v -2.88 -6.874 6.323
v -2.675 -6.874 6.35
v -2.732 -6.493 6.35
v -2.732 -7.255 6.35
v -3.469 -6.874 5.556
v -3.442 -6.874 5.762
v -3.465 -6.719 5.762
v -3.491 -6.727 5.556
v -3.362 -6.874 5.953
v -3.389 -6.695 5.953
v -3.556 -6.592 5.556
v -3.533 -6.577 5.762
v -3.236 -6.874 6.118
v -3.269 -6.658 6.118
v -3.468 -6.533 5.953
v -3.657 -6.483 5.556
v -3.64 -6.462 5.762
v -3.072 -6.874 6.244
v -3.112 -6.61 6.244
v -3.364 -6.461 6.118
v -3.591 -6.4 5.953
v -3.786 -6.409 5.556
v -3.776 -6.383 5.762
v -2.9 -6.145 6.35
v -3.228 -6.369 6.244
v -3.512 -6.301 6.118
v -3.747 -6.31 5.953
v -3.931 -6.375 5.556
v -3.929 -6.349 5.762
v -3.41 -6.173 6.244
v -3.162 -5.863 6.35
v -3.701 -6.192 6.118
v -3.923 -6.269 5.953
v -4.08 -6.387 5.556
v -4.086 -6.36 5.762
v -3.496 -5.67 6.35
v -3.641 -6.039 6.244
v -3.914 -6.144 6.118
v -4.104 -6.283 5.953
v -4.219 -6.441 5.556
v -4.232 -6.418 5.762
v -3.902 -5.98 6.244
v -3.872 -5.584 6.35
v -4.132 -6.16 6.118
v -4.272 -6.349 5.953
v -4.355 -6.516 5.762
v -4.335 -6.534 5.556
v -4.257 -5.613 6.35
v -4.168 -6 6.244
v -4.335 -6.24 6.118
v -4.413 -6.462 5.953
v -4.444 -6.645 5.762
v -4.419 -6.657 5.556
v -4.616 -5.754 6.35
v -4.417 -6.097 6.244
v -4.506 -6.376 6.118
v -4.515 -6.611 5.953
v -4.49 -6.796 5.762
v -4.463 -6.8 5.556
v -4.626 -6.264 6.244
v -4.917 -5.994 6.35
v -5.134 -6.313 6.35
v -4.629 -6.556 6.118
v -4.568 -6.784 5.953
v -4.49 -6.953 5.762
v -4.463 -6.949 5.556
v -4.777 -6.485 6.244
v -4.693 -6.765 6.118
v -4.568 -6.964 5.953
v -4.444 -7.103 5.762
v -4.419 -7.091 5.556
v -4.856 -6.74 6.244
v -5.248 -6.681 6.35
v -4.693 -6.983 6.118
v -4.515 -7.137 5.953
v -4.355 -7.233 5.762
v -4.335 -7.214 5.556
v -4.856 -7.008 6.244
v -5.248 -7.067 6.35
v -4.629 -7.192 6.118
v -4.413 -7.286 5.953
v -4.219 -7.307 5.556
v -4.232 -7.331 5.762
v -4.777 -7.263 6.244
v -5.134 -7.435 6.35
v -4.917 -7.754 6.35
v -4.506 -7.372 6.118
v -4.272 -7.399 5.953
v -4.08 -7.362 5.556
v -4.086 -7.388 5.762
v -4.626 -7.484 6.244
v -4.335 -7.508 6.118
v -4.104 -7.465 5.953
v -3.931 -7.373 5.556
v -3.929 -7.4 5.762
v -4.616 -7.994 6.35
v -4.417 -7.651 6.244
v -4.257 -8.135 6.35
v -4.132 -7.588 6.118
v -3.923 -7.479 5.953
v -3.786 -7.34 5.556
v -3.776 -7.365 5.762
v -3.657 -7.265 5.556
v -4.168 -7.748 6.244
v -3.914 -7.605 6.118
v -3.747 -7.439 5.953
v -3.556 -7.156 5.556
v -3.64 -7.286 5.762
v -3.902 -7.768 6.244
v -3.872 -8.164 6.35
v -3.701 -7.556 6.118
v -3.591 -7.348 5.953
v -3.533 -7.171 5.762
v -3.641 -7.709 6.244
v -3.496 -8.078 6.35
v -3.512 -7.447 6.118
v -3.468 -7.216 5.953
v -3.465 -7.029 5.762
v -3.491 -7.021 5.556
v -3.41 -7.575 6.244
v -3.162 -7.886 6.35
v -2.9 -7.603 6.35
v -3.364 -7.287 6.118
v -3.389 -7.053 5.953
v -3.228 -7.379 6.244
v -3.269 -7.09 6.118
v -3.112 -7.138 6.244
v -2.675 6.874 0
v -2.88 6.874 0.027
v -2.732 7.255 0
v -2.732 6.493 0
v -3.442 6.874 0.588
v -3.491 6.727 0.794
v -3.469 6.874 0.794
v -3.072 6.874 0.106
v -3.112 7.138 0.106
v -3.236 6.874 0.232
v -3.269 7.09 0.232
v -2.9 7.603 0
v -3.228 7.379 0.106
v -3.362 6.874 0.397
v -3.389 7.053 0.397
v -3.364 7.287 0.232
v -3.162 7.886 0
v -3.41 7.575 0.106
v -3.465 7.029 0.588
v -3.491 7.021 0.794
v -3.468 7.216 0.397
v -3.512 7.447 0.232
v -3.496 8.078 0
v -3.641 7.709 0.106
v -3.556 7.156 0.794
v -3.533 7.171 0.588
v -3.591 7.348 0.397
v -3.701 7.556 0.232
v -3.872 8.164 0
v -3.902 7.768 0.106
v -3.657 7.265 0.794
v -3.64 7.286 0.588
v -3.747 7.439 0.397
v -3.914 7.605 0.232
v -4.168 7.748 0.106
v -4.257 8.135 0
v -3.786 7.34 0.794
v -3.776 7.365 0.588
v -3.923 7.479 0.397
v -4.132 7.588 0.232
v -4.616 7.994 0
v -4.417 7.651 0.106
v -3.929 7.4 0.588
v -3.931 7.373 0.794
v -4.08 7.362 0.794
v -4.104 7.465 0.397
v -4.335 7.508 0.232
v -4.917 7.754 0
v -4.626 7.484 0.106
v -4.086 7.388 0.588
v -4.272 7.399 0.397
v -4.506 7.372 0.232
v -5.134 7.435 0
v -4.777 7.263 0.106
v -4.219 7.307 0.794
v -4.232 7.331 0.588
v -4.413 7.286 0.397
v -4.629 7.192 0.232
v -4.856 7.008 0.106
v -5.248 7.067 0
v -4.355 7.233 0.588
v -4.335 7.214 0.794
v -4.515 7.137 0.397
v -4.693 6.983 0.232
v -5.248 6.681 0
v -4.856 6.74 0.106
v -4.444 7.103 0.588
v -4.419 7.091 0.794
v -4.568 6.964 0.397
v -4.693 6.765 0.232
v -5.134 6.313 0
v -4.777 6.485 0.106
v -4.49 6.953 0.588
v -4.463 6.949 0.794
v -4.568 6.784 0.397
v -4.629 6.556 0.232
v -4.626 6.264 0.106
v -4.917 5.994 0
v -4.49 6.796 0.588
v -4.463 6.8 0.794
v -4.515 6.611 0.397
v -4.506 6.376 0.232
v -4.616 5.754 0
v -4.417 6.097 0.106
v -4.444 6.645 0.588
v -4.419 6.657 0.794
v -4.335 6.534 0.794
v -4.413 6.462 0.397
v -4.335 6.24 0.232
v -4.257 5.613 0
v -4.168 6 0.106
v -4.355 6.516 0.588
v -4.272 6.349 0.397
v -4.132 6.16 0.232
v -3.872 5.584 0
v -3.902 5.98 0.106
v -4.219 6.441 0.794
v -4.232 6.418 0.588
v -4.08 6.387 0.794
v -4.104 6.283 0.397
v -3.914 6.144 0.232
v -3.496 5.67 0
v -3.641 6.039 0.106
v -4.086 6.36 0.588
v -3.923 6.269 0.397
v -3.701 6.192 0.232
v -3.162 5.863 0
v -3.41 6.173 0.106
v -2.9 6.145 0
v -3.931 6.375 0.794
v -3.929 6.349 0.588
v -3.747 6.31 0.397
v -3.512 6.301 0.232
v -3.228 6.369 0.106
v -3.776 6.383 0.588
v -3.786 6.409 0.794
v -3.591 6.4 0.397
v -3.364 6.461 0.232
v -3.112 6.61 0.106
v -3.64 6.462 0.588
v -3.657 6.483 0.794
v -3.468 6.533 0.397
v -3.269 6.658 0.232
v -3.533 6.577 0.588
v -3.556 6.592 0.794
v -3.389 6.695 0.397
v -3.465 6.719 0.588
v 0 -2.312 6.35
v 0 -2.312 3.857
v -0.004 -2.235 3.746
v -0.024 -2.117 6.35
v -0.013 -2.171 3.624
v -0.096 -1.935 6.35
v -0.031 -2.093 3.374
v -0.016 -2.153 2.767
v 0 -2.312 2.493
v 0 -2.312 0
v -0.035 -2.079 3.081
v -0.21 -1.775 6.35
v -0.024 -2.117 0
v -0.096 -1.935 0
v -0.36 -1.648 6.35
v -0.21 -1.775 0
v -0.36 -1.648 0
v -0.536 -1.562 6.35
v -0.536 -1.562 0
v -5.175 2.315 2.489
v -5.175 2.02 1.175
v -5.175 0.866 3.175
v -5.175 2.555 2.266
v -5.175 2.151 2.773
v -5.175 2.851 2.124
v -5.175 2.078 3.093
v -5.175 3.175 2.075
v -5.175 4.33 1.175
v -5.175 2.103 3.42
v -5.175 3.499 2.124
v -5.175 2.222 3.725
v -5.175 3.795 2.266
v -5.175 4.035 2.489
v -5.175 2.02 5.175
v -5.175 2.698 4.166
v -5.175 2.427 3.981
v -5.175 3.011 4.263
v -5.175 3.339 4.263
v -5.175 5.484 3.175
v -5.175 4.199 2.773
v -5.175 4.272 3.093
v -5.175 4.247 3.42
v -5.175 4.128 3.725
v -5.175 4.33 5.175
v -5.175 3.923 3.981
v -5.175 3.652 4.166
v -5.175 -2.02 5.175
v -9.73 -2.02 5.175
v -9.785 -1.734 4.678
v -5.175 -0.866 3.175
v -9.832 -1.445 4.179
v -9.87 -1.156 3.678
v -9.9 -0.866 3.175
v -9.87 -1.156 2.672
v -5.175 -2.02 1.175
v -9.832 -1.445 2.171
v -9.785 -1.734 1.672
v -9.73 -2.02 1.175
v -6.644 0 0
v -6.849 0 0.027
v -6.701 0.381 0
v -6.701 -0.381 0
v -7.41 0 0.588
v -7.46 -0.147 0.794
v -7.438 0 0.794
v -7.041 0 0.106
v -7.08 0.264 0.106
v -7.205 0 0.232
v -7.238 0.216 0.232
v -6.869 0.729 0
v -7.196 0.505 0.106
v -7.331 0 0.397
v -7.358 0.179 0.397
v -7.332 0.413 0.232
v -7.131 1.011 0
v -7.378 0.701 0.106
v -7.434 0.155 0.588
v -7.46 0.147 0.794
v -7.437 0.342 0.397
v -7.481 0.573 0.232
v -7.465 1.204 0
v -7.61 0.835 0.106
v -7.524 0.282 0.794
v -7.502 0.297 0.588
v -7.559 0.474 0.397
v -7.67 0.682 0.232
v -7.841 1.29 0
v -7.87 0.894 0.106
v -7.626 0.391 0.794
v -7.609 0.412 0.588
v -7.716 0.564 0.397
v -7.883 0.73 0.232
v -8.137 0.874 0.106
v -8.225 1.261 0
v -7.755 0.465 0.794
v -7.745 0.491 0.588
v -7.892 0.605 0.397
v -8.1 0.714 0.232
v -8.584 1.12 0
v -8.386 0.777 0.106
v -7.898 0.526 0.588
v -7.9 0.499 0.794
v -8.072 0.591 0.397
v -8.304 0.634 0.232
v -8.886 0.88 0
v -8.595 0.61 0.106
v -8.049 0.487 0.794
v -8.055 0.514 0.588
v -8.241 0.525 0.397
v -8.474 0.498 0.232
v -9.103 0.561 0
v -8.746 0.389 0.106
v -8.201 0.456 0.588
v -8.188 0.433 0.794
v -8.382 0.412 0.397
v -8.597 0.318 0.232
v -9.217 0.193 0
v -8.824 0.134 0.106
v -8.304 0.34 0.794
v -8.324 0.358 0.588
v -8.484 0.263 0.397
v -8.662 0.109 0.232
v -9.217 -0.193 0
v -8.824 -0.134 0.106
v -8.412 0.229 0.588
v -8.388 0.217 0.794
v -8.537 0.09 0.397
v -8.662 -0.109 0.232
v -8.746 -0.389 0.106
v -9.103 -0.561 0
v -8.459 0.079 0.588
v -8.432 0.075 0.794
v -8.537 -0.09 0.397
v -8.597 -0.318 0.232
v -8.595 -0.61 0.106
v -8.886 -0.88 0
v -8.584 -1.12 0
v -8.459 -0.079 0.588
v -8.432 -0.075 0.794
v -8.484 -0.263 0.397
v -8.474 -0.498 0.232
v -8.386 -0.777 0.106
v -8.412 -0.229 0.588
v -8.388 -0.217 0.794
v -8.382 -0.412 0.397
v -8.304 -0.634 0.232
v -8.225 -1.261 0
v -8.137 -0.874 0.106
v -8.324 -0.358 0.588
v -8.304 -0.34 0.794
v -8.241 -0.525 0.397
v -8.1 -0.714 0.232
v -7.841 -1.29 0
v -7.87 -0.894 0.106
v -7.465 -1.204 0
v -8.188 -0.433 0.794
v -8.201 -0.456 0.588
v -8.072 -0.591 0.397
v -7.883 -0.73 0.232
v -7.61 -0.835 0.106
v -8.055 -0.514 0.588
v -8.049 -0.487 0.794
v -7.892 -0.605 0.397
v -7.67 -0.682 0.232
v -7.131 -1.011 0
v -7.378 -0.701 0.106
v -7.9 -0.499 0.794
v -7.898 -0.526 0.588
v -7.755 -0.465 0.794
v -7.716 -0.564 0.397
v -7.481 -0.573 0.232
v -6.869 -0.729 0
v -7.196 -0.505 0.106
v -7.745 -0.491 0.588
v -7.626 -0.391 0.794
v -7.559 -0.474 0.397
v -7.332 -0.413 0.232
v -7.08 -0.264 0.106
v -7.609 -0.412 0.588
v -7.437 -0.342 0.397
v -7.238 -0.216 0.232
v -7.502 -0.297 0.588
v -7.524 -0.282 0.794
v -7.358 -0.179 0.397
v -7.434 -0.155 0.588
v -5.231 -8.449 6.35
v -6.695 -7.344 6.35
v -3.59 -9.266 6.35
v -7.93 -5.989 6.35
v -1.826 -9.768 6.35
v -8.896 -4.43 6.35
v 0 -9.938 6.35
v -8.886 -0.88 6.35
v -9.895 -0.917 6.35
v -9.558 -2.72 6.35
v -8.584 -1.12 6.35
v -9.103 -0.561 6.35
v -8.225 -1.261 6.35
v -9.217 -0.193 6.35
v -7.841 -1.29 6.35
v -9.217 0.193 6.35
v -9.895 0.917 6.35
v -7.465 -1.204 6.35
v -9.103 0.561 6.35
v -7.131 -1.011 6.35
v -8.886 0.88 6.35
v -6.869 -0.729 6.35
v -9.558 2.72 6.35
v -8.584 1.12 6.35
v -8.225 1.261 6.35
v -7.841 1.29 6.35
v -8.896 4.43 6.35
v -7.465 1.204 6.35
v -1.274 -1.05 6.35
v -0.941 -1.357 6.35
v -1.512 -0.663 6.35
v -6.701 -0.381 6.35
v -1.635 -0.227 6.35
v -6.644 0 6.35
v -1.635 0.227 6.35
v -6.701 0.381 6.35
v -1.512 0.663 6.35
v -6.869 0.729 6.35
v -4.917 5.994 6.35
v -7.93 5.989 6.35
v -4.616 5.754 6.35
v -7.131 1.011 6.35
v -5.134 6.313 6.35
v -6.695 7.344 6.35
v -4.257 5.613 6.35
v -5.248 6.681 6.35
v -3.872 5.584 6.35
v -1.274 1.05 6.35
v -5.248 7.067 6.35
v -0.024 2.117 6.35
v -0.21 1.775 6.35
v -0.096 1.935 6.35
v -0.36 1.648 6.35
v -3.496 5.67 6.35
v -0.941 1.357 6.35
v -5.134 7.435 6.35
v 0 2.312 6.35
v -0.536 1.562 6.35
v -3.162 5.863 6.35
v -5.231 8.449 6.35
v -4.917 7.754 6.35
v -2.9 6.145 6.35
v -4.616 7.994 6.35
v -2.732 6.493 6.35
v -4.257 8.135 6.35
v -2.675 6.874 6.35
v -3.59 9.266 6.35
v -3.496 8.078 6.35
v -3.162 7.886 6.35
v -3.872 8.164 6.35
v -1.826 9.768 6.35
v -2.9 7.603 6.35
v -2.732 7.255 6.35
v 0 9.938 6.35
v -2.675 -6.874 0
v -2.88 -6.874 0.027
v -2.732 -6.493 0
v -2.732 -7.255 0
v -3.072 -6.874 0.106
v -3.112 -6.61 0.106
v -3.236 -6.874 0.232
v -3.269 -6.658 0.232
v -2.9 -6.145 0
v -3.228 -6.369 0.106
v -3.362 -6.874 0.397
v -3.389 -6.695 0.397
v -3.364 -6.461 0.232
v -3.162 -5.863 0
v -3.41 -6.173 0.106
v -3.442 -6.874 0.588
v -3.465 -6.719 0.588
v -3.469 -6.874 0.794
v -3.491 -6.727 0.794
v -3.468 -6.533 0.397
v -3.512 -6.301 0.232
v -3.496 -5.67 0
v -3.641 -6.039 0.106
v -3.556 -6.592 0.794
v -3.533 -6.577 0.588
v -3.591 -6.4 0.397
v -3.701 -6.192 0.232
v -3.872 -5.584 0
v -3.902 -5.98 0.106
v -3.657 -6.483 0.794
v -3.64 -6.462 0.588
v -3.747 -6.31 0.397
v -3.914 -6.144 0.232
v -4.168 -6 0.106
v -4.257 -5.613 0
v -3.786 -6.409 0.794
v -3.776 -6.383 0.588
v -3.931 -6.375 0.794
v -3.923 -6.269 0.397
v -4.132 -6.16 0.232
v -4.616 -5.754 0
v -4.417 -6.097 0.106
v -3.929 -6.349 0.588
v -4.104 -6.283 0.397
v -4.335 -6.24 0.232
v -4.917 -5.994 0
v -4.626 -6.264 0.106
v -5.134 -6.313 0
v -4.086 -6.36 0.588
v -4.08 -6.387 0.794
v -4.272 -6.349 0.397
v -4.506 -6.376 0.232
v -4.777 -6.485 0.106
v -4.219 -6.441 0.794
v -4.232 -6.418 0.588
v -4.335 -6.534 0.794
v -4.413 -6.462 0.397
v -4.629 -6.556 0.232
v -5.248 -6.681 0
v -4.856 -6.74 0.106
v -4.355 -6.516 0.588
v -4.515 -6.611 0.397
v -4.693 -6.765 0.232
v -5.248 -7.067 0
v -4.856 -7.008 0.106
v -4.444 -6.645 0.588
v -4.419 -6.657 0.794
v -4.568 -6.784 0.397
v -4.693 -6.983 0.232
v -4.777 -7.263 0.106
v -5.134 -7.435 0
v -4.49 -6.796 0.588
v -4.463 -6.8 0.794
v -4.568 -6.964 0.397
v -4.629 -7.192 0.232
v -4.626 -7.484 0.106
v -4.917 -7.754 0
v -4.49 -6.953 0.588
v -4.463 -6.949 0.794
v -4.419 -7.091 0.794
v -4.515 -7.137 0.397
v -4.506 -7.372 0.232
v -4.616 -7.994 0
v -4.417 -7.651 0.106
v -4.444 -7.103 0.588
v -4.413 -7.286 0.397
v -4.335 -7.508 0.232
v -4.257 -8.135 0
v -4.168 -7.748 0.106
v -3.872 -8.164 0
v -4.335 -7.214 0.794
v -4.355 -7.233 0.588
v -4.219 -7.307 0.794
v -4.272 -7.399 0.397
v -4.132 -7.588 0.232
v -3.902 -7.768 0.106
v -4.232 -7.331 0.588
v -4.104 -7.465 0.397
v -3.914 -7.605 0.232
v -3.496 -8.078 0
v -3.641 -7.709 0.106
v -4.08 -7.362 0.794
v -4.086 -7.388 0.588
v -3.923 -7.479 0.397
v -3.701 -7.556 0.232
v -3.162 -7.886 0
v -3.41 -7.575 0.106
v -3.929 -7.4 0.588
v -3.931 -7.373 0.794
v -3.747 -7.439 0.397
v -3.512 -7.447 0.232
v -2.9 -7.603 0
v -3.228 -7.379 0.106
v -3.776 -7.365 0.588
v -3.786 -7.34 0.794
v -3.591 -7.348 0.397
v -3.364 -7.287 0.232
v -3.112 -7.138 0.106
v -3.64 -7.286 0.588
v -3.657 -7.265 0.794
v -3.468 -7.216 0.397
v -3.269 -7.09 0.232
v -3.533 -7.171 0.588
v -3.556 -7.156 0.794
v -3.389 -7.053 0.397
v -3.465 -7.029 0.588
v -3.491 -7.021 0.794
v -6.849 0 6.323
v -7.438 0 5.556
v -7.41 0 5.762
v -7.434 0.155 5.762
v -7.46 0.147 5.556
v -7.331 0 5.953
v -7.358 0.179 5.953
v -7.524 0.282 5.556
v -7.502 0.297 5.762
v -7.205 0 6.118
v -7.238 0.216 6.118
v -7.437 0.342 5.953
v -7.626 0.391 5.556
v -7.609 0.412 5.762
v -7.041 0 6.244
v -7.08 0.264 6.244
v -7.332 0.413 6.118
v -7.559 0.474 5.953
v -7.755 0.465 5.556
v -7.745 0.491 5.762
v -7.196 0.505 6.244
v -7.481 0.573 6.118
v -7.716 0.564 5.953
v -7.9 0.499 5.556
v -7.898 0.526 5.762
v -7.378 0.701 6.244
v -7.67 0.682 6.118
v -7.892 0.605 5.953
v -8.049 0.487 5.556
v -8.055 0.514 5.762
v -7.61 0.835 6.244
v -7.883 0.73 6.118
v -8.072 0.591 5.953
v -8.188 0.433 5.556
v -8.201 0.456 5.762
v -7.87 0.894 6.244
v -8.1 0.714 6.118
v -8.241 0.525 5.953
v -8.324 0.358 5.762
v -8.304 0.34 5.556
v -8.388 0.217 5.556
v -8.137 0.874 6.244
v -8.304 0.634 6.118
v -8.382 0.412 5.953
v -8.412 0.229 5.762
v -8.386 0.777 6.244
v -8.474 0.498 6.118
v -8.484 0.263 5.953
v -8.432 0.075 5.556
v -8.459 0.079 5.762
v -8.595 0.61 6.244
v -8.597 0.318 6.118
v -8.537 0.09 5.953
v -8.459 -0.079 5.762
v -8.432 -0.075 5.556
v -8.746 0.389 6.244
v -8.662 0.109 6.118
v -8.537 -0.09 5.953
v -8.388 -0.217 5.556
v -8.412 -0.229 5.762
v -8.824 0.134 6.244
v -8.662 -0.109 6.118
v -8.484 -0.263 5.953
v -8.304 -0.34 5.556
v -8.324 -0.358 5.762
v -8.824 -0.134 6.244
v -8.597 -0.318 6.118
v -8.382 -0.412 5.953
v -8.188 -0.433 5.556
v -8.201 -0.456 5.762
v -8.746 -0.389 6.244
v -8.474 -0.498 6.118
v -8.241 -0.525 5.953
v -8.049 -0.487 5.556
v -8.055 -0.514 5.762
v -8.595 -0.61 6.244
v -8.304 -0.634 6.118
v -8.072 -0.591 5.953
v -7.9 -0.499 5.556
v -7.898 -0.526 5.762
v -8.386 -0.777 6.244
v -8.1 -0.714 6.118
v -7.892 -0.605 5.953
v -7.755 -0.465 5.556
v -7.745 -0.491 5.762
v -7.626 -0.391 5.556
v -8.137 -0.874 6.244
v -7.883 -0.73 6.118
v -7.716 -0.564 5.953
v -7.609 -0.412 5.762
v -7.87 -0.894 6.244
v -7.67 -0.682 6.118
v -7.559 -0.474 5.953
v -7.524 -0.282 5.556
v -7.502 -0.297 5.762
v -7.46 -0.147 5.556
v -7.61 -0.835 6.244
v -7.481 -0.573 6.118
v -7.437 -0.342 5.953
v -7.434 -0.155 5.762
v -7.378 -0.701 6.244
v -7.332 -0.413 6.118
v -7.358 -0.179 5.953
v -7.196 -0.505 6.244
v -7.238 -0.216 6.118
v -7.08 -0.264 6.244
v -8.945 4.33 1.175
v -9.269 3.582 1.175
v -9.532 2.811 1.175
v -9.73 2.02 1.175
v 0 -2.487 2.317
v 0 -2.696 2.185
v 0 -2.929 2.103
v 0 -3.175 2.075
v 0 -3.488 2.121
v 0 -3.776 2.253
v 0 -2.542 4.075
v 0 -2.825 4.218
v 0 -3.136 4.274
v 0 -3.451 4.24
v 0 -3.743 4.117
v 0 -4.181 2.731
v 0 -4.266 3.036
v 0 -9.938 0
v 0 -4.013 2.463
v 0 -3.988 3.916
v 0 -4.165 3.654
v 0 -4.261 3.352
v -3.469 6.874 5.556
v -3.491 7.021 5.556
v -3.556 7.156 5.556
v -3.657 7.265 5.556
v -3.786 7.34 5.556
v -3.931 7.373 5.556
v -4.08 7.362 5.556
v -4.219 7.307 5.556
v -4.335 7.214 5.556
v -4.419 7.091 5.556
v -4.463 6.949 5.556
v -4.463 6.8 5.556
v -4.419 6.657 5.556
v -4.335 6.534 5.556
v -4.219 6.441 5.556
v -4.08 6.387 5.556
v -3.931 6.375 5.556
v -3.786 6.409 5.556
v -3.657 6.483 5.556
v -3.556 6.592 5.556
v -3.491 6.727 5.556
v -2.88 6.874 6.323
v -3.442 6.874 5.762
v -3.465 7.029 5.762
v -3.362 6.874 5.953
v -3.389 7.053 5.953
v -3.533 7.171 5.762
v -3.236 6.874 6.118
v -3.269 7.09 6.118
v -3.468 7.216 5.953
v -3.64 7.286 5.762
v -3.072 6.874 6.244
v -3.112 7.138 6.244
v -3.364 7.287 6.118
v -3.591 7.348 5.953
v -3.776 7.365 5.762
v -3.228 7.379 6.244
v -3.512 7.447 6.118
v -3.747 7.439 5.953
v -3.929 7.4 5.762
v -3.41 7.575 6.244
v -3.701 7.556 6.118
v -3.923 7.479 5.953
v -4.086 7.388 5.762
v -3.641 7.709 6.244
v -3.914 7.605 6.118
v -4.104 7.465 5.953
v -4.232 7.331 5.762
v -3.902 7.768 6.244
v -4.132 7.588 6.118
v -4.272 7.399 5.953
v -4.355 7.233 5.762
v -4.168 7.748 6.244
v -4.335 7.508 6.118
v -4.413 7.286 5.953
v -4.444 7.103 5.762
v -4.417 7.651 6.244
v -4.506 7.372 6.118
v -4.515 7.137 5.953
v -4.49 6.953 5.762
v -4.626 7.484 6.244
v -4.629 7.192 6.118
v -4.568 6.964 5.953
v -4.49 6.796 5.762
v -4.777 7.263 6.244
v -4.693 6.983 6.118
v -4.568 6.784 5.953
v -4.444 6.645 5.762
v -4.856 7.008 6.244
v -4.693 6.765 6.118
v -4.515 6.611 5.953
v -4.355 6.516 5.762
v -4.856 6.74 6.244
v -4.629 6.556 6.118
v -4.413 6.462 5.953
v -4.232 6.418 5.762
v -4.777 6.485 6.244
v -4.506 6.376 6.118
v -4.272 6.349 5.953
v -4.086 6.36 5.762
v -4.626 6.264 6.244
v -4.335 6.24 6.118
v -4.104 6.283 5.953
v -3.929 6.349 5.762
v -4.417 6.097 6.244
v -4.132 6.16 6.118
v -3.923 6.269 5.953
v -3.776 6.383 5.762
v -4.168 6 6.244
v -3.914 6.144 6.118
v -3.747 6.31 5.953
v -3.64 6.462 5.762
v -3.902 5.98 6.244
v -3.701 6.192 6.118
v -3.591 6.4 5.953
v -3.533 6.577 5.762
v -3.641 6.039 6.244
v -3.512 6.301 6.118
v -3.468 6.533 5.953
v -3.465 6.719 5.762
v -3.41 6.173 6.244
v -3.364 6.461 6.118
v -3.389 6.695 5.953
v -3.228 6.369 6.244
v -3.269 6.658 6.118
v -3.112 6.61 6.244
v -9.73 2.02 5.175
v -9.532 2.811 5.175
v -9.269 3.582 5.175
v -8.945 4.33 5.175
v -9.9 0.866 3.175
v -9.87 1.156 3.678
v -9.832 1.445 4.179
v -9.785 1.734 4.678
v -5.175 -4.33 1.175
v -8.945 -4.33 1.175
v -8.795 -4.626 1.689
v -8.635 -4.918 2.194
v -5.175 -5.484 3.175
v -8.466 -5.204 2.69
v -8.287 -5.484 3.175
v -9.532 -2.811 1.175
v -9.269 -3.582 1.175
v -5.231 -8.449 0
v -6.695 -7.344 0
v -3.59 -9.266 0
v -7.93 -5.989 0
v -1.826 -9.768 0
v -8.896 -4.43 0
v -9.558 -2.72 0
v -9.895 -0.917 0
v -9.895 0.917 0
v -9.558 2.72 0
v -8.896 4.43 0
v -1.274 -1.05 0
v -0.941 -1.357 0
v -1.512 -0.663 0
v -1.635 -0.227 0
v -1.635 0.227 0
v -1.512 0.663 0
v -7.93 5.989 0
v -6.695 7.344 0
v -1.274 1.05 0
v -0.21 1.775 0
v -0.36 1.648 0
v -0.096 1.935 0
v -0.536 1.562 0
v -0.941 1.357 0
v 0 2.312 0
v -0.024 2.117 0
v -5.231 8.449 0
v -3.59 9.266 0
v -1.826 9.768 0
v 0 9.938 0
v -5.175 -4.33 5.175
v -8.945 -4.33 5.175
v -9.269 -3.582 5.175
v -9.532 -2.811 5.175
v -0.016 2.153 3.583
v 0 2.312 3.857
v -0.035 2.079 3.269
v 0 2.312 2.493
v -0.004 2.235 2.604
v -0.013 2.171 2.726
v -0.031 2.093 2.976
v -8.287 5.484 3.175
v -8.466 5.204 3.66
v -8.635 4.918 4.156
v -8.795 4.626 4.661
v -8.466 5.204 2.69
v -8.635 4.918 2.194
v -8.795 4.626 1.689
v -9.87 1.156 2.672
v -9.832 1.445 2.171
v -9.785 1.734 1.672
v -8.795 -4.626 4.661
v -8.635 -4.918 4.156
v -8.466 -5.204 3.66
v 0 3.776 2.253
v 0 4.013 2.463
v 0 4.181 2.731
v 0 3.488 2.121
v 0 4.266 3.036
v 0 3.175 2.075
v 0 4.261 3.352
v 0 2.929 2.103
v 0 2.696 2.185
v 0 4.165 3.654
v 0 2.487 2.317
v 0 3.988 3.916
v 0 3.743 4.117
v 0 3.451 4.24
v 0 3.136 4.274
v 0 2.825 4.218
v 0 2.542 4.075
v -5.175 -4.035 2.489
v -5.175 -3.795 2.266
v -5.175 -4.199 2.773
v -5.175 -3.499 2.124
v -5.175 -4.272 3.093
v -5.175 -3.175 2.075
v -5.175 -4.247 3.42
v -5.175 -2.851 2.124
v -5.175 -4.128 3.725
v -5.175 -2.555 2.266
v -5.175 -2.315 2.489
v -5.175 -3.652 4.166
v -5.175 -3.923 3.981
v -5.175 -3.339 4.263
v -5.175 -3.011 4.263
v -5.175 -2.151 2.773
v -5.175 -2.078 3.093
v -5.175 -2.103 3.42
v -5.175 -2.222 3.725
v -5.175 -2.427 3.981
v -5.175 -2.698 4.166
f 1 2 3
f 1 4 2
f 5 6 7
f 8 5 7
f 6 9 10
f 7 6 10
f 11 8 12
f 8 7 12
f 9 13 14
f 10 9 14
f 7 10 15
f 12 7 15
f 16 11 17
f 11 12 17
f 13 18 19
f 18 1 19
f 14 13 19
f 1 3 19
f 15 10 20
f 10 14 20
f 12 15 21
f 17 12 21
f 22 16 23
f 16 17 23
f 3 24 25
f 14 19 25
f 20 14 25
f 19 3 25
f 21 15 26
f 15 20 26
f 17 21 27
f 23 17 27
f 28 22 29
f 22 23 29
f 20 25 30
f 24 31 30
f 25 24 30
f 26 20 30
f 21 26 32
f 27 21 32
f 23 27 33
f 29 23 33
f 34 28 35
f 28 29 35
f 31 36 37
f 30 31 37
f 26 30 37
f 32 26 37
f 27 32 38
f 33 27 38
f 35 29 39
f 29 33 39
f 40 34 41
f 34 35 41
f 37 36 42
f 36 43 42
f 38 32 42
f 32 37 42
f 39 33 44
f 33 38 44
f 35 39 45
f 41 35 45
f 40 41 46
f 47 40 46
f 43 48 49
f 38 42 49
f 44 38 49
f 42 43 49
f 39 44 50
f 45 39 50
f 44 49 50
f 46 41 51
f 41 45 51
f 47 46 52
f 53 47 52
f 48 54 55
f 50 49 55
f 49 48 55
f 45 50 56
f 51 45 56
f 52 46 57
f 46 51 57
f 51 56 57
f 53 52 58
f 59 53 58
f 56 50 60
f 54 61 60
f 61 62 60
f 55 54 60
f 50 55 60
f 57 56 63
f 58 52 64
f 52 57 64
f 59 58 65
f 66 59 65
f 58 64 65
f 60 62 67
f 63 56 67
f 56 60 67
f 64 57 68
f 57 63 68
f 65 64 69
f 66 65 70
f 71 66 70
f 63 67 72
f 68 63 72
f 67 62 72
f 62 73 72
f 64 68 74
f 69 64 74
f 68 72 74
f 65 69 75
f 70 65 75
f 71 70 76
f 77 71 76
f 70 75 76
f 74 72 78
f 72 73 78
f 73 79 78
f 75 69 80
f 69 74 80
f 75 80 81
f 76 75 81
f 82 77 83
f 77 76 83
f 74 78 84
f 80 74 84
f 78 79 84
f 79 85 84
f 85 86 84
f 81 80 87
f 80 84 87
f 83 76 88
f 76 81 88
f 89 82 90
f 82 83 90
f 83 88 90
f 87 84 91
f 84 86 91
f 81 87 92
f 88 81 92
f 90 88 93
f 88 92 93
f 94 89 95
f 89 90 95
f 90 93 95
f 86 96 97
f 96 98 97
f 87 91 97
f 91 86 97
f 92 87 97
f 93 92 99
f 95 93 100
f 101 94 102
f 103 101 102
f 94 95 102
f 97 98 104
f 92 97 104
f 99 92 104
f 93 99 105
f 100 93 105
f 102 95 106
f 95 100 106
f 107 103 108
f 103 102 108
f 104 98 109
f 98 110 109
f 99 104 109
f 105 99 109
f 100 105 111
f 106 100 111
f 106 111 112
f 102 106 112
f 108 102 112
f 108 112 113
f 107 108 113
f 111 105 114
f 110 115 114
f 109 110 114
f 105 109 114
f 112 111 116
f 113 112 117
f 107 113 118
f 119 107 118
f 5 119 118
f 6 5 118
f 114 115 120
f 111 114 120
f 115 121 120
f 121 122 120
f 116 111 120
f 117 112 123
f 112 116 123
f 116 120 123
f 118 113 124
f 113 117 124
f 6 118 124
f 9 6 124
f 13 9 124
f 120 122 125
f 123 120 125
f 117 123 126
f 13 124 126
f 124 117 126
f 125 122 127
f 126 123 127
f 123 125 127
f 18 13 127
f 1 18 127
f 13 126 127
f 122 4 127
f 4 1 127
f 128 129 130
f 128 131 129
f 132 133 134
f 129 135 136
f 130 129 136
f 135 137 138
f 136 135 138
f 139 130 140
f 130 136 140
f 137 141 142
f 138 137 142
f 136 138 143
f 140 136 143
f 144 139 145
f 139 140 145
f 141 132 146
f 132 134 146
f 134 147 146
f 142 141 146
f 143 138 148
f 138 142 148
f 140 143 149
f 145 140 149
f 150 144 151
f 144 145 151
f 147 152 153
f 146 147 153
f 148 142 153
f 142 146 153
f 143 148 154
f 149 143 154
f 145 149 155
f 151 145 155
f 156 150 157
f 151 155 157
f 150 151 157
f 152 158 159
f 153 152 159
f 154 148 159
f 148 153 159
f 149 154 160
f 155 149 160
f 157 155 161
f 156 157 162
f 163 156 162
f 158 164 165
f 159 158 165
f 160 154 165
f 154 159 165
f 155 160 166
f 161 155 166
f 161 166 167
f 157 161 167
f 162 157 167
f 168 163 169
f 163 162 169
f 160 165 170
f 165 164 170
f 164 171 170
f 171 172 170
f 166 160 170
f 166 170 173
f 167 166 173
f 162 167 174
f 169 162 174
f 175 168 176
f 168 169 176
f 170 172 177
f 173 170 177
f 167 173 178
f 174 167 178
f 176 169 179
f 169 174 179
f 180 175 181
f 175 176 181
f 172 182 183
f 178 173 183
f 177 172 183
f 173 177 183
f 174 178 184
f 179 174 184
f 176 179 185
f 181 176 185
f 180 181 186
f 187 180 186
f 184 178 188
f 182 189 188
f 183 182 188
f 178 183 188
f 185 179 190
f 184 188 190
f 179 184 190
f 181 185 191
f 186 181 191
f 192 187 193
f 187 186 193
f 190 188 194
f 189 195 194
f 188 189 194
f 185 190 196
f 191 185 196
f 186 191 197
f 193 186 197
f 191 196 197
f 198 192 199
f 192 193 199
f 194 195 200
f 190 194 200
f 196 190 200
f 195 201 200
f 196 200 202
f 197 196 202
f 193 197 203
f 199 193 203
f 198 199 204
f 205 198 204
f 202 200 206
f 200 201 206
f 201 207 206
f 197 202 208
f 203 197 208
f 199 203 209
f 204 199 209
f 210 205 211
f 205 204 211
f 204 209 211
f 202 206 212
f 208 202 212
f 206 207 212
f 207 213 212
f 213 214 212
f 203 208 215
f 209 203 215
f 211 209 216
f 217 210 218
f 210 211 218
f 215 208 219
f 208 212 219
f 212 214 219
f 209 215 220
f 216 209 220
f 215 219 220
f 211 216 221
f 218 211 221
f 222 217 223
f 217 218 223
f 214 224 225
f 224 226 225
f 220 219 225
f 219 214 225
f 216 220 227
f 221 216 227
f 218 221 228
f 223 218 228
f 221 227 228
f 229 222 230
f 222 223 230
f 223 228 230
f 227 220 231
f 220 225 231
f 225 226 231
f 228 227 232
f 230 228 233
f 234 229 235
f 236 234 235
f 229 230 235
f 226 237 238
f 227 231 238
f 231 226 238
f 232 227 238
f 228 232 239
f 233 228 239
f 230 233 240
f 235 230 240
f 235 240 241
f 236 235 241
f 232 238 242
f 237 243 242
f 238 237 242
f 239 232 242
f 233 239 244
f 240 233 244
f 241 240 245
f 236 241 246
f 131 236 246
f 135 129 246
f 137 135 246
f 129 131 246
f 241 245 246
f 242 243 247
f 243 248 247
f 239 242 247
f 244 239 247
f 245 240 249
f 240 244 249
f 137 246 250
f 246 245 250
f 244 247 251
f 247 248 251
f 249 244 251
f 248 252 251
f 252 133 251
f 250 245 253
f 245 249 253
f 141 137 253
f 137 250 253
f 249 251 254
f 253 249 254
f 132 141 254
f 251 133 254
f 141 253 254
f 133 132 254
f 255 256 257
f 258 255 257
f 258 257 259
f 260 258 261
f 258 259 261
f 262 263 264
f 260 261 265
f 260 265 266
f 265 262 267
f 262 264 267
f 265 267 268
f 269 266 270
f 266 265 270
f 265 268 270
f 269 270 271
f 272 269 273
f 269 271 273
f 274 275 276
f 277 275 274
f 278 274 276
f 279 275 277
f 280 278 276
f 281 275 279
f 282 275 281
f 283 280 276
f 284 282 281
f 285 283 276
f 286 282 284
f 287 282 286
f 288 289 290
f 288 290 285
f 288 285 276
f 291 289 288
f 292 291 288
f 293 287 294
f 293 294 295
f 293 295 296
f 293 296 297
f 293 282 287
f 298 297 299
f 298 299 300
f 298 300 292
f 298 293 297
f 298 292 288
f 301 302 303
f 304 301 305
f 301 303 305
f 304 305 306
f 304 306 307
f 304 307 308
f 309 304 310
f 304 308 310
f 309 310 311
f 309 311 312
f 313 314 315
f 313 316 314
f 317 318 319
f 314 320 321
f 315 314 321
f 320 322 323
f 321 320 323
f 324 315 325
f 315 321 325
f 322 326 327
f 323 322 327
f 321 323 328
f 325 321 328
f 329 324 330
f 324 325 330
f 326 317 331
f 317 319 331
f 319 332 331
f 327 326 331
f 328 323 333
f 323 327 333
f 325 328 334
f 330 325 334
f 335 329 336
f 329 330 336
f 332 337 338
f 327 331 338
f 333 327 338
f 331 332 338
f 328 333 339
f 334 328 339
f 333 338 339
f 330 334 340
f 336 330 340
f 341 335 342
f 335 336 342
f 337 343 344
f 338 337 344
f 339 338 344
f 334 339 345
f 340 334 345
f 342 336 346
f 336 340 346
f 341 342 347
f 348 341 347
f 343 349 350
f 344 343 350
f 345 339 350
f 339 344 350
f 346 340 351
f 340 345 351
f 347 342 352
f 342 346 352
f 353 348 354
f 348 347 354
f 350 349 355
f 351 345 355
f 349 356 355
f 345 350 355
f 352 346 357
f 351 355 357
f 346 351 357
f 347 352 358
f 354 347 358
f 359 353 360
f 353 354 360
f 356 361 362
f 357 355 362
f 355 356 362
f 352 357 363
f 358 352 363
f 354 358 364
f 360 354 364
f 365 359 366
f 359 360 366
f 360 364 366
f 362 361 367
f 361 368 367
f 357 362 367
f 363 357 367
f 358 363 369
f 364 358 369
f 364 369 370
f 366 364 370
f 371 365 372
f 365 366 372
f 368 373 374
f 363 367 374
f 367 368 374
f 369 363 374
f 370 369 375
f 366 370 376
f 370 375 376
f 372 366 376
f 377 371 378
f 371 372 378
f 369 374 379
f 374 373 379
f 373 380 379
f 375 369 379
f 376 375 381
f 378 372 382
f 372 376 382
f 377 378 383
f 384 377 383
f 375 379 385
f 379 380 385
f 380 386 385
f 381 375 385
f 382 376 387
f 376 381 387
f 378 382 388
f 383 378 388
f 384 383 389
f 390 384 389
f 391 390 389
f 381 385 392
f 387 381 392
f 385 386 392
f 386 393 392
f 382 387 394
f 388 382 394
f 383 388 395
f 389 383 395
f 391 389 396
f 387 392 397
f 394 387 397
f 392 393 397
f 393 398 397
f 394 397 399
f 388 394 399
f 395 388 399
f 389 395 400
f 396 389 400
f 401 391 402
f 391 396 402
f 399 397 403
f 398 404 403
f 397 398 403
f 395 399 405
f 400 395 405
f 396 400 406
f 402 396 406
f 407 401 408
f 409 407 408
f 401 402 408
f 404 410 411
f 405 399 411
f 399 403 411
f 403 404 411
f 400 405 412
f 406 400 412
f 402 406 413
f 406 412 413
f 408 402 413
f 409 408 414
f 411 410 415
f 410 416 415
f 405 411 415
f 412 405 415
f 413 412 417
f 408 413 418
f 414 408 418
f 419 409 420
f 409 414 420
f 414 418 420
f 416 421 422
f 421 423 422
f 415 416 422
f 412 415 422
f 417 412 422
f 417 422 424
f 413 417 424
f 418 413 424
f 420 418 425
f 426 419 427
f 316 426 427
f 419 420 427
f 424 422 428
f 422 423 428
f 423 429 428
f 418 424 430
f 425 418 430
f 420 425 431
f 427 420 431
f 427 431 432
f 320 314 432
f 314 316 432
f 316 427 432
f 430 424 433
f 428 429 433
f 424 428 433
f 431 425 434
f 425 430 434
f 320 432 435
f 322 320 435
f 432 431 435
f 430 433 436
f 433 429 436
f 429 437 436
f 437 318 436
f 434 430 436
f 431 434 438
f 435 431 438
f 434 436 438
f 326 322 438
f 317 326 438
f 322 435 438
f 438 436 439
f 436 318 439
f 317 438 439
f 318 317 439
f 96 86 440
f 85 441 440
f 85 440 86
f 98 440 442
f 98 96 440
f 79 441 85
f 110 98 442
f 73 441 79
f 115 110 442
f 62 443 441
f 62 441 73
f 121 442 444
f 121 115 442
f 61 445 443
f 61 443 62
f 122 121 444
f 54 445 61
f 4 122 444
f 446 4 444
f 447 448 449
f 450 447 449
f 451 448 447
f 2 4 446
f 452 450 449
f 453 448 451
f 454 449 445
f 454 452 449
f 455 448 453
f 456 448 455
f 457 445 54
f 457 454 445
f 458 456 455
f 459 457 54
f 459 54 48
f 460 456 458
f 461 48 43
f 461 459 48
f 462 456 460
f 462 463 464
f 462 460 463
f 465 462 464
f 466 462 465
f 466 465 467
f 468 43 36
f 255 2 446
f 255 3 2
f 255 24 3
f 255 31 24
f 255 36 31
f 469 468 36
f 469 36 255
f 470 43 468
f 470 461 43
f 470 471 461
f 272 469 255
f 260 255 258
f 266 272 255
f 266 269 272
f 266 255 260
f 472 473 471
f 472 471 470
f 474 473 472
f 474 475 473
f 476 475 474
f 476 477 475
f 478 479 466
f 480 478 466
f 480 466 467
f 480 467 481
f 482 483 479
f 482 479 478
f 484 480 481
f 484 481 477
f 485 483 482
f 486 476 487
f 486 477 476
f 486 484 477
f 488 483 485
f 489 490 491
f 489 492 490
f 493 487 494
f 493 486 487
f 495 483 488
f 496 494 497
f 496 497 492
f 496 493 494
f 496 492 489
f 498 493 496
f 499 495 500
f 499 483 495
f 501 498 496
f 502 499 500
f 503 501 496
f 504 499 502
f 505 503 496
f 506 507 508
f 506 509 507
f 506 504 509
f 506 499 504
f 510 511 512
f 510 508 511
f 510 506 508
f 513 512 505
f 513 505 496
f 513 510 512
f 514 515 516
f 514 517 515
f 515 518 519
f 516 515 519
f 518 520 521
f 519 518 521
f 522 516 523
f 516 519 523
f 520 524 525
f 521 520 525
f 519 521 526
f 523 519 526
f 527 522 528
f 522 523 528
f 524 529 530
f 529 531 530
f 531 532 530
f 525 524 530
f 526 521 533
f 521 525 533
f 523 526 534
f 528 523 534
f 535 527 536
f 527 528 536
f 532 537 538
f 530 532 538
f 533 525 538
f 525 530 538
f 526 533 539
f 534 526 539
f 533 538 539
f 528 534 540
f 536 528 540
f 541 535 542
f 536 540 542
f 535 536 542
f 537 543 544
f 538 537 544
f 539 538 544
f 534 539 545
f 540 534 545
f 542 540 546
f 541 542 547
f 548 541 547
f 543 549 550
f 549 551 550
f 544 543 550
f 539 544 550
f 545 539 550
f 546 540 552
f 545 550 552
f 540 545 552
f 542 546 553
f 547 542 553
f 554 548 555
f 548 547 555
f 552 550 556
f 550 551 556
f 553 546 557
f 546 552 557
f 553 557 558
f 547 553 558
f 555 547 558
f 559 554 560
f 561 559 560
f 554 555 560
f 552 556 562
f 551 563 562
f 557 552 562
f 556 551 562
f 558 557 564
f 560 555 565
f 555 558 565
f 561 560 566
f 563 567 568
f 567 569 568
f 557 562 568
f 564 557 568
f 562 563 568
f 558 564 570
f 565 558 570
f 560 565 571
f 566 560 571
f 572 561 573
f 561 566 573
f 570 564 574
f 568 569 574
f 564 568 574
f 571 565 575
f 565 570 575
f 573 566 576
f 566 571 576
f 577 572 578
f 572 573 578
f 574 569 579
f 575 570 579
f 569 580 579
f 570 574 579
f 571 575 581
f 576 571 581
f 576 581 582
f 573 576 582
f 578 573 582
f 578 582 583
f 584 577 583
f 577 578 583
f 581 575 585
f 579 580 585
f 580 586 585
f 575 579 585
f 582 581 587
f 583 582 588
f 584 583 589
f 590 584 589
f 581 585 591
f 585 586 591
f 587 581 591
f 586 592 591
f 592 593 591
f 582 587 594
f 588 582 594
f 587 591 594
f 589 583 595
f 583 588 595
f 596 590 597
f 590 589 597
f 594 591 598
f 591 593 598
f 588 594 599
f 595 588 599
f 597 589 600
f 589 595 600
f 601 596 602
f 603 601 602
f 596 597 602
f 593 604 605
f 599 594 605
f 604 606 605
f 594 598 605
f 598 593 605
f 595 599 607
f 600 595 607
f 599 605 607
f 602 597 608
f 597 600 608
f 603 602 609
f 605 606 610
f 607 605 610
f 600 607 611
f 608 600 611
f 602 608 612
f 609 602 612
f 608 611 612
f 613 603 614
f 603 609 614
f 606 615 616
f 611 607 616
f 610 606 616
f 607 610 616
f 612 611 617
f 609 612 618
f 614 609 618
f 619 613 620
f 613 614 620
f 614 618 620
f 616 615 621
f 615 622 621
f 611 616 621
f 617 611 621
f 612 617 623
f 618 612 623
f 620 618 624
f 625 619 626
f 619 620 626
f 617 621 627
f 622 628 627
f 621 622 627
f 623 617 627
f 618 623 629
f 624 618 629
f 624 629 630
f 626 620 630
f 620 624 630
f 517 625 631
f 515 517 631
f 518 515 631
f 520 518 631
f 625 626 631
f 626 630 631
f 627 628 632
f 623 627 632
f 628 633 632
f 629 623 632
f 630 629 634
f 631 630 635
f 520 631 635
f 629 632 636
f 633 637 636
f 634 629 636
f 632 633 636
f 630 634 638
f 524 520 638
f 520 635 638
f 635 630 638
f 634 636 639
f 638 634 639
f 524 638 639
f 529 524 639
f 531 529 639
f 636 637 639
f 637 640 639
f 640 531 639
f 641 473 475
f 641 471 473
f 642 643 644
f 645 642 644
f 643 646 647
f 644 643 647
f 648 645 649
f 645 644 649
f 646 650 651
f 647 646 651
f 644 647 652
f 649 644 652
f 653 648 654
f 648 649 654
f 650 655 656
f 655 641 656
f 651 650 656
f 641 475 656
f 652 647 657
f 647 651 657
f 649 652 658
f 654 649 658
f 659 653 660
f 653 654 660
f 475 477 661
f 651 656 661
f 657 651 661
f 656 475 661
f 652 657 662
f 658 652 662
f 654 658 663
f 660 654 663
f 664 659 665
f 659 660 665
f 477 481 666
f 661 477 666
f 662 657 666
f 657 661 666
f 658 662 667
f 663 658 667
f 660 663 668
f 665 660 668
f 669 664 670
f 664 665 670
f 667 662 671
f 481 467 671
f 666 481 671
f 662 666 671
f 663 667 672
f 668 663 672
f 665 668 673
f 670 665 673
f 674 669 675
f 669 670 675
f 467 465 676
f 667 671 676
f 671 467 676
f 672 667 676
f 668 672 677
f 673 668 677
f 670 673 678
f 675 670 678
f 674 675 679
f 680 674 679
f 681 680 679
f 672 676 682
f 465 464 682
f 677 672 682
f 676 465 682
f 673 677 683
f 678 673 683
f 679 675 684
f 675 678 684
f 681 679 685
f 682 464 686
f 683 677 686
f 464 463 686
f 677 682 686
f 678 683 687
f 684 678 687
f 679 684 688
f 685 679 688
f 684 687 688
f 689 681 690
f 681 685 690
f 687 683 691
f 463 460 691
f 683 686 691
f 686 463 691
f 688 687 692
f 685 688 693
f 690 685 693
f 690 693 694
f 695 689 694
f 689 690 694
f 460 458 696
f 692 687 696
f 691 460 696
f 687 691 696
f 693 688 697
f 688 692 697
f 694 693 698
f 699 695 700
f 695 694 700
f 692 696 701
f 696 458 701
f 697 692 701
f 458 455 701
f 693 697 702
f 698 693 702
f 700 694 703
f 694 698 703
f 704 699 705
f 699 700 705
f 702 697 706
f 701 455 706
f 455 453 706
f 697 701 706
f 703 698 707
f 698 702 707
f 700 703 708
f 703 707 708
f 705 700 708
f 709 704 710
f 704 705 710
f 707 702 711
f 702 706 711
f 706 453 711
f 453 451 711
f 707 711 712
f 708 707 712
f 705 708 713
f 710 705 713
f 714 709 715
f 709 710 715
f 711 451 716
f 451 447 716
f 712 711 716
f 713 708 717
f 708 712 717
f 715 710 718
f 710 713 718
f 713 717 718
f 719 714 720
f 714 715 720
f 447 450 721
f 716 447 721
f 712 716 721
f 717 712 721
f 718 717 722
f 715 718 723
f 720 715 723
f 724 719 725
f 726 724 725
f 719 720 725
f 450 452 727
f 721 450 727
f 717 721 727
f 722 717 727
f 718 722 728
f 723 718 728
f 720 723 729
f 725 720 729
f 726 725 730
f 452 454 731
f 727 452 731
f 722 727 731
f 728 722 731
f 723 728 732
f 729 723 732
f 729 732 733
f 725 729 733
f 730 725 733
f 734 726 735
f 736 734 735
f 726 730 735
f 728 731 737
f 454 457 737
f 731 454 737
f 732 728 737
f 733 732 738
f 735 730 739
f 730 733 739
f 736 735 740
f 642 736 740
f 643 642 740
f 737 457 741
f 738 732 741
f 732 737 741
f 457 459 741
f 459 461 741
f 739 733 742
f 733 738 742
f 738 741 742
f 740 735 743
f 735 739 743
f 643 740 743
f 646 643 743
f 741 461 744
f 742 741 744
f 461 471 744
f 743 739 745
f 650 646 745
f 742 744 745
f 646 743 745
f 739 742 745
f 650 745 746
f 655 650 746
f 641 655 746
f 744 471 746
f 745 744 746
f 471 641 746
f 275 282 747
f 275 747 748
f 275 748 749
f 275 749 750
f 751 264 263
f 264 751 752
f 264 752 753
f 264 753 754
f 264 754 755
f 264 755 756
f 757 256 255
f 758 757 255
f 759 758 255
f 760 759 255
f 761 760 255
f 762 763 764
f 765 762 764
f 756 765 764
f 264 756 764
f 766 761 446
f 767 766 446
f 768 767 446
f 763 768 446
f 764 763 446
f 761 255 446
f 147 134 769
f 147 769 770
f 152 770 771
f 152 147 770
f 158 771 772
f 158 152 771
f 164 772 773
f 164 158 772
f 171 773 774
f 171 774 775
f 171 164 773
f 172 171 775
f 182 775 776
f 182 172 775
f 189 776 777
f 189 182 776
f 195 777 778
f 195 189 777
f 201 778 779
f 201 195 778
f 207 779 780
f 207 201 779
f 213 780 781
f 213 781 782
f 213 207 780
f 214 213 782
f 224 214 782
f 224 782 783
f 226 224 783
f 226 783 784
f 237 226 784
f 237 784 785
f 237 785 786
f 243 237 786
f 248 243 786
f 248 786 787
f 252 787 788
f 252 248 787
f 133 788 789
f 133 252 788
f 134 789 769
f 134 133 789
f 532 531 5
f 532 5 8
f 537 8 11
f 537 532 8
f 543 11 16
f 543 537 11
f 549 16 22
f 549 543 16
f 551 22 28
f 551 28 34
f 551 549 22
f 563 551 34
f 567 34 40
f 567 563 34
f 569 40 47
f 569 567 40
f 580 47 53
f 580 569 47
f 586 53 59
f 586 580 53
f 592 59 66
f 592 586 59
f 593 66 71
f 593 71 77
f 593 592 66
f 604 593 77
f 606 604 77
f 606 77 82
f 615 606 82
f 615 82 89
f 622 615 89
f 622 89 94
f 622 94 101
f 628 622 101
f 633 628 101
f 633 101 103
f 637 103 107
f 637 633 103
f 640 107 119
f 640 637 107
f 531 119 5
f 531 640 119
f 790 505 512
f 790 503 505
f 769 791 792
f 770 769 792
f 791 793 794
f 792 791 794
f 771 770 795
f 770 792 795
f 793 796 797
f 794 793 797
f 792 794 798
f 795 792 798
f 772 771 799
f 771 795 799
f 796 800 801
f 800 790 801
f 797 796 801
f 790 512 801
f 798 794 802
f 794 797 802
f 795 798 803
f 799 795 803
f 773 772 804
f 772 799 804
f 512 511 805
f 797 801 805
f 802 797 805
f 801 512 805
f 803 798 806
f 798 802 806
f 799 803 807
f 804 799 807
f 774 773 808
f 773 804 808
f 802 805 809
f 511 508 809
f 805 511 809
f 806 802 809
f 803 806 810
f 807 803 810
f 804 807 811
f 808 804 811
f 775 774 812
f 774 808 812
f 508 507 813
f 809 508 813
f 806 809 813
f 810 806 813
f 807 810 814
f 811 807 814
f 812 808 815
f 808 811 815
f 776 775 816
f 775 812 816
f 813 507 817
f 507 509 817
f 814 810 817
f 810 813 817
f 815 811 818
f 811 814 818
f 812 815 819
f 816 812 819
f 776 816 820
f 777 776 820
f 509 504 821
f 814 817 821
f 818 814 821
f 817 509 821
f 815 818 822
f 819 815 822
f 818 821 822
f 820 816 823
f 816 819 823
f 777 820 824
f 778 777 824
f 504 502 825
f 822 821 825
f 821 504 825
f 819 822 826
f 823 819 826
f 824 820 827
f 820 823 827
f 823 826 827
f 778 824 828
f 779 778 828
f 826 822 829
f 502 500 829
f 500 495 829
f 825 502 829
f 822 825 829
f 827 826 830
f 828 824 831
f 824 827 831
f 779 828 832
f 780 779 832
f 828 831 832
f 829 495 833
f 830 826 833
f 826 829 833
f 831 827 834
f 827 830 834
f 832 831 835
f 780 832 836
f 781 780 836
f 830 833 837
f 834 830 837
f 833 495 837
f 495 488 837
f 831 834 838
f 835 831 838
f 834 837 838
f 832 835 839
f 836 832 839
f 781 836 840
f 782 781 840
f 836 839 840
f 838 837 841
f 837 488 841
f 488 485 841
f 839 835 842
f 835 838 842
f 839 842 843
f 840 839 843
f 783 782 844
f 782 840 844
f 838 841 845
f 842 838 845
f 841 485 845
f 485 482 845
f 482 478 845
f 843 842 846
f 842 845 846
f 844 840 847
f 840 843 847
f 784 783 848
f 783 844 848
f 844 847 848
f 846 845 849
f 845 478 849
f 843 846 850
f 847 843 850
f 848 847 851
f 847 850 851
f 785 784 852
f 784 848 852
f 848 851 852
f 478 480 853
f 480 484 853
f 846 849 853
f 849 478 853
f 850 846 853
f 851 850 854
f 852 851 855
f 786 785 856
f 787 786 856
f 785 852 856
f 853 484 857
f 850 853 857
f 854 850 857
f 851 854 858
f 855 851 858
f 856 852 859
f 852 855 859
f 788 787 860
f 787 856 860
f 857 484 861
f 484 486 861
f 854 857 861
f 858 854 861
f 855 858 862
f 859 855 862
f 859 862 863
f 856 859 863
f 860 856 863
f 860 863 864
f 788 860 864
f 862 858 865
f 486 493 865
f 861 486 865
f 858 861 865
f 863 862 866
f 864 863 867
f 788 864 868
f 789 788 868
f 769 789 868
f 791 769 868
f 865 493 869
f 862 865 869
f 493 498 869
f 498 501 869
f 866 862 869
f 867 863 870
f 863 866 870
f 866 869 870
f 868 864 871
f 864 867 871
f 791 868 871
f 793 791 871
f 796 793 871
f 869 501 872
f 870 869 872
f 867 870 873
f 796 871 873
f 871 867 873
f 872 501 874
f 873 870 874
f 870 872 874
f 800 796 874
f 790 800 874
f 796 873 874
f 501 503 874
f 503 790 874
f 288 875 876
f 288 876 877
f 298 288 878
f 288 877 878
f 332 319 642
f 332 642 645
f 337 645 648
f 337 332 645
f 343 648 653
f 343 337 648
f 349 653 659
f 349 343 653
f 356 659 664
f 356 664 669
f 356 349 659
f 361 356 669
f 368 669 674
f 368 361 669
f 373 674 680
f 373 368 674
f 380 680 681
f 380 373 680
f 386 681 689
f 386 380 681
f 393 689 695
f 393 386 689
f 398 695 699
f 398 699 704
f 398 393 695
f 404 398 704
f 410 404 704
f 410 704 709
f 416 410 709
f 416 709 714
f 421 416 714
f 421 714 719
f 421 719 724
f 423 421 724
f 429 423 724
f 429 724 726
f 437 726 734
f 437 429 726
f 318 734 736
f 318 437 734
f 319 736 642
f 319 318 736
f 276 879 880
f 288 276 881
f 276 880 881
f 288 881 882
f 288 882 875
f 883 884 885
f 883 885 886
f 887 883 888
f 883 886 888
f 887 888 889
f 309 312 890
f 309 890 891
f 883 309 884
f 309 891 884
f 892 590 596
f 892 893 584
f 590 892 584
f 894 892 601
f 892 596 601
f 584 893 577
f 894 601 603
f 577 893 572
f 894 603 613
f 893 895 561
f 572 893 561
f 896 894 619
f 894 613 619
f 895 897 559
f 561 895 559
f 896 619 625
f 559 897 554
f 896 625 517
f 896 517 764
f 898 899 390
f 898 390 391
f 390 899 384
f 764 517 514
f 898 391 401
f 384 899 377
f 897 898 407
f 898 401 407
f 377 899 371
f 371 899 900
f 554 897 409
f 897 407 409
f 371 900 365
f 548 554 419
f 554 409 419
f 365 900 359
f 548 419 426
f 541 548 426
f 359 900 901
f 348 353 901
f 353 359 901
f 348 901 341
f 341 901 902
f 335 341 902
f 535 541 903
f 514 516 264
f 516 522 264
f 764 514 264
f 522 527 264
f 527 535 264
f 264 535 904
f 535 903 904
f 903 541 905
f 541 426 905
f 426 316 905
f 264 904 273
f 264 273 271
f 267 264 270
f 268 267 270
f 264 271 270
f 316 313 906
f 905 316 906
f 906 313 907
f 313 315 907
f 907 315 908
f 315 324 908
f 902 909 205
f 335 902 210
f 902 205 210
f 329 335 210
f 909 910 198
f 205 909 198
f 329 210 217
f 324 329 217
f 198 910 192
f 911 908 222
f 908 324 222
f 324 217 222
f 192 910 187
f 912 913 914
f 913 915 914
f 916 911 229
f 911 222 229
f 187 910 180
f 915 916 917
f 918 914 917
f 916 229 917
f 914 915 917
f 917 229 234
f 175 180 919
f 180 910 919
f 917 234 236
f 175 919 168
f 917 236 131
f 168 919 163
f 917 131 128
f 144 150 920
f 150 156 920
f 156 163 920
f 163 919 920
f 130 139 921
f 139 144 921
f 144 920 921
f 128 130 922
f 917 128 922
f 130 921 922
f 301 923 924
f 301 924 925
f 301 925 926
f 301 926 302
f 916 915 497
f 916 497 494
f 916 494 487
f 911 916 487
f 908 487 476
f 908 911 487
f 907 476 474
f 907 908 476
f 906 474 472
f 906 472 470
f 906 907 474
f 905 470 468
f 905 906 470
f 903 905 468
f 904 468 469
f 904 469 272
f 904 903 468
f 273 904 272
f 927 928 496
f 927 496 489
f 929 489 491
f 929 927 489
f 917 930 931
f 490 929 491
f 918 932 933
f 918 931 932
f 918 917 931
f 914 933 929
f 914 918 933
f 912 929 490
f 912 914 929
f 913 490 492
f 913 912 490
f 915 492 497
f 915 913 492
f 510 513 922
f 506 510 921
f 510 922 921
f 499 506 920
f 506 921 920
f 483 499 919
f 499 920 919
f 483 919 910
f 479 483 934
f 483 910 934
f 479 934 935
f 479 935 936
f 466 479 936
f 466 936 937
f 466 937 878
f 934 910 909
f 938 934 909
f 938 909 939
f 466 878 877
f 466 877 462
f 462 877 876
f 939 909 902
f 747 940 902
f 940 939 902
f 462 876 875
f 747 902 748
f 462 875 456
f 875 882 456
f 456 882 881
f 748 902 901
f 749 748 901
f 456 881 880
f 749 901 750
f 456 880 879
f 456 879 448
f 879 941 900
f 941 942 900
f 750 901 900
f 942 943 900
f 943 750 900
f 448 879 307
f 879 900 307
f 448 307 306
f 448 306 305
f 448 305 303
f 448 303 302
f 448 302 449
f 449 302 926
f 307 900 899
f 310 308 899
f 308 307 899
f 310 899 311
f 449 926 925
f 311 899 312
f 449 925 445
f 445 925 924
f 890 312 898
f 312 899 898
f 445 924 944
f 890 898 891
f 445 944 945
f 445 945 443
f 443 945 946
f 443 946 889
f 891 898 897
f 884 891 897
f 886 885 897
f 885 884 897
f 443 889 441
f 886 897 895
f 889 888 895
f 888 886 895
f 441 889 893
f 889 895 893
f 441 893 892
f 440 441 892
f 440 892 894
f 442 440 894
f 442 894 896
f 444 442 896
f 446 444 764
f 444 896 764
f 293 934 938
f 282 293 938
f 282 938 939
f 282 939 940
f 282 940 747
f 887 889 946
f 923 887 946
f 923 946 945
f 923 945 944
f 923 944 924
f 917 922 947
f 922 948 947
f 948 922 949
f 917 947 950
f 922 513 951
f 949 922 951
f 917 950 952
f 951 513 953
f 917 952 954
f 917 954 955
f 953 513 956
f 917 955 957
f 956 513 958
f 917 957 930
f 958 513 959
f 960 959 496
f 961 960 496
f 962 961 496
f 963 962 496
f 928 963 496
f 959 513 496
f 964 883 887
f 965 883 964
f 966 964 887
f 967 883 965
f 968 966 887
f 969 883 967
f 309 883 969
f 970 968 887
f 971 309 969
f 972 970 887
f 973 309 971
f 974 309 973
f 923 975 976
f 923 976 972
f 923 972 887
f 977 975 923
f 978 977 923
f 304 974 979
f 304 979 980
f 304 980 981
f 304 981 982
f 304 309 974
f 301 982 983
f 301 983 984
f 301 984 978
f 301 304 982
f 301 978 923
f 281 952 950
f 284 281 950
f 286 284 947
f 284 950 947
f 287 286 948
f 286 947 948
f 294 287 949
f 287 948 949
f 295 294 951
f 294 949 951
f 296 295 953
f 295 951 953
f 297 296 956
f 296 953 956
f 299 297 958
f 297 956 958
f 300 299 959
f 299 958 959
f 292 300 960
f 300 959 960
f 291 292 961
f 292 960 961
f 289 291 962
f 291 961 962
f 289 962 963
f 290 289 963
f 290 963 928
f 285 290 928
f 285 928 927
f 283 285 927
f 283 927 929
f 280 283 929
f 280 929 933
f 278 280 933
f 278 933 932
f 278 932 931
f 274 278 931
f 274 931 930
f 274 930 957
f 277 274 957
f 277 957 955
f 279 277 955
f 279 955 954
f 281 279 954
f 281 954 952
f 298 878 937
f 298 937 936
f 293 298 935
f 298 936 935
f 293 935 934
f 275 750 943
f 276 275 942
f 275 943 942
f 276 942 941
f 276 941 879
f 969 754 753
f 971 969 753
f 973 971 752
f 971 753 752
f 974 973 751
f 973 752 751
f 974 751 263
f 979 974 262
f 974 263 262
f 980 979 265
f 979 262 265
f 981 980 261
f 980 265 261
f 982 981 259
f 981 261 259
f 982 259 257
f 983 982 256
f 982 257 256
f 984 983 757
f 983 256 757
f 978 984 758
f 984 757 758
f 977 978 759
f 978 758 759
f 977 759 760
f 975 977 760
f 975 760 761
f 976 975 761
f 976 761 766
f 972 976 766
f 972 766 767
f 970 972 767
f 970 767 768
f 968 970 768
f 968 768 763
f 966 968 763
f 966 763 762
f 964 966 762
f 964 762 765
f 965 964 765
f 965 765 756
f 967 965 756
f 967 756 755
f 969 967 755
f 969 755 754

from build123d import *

# Parameters (mm, degrees)
SKETCH1_R            = 9.9375
SKETCH1_R_2          = 1.651
SKETCH1_R_3          = 0.5
BOSS_EXTRUDE1_DEPTH  = 6.35
CUT_EXTRUDE1_DEPTH   = 16.421748036
FILLET1_R            = 0.79375
FILLET2_R            = 0.79375
M2_CLEARANCE_HOLE1_D = 2.2
CUT_EXTRUDE2_DEPTH   = 4.7625


with BuildPart() as part:
    # Sketch1 → Boss-Extrude1 (new body)
    with BuildSketch(Plane.XY):
        Circle(SKETCH1_R)
        Circle(SKETCH1_R_2, mode=Mode.SUBTRACT)
        with Locations((-7.9375, 0)):
            Circle(SKETCH1_R_3, mode=Mode.SUBTRACT)
        with Locations((-3.96875, 6.874076643)):
            Circle(SKETCH1_R_3, mode=Mode.SUBTRACT)
        with Locations((3.96875, 6.874076643)):
            Circle(SKETCH1_R_3, mode=Mode.SUBTRACT)
        with Locations((7.9375, 0)):
            Circle(SKETCH1_R_3, mode=Mode.SUBTRACT)
        with Locations((3.96875, -6.874076643)):
            Circle(SKETCH1_R_3, mode=Mode.SUBTRACT)
        with Locations((-3.96875, -6.874076643)):
            Circle(SKETCH1_R_3, mode=Mode.SUBTRACT)
    extrude(amount=BOSS_EXTRUDE1_DEPTH)

    # Sketch2 → Cut-Extrude1 (cut, through all)
    with BuildSketch(Plane.XY.offset(6.35)):
        Polygon((0, 0), (0, 25.4), (50.8, 25.4), (50.8, -25.4), (0, -25.4), align=None)
    extrude(amount=-CUT_EXTRUDE1_DEPTH, mode=Mode.SUBTRACT)

    # Fillet1
    fillet1_edges = [part.edges().sort_by_distance(p)[0] for p in [
        (0, -1.651, 3.175),
        (0, 1.651, 3.175),
    ]]
    fillet(fillet1_edges, radius=FILLET1_R)

    # Fillet2
    fillet2_edges = [part.edges().sort_by_distance(p)[0] for p in [
        (-4.46875, 6.874076643, 0),
        (-4.46875, 6.874076643, 6.35),
        (-4.46875, -6.874076643, 0),
        (-4.46875, -6.874076643, 6.35),
        (-8.4375, 0, 0),
        (-8.4375, 0, 6.35),
    ]]
    fillet(fillet2_edges, radius=FILLET2_R)

    # M2 Clearance Hole1 (through all)
    with Locations(Plane.ZY.offset(9.9375)):
        with Locations((3.175, 3.175), (3.175, -3.175)):
            Hole(M2_CLEARANCE_HOLE1_D / 2)

    # Sketch13 → Cut-Extrude2 (cut)
    with BuildSketch(Plane.ZY.offset(9.9375)):
        Polygon((1.175, 4.329700538), (1.175, 2.020299462), (3.175, 0.865598923), (5.175, 2.020299462), (5.175, 4.329700538), (3.175, 5.484401077), align=None)
        Polygon((1.175, -2.020299462), (1.175, -4.329700538), (3.175, -5.484401077), (5.175, -4.329700538), (5.175, -2.020299462), (3.175, -0.865598923), align=None)
    extrude(amount=-CUT_EXTRUDE2_DEPTH, mode=Mode.SUBTRACT)


solid = part.part
